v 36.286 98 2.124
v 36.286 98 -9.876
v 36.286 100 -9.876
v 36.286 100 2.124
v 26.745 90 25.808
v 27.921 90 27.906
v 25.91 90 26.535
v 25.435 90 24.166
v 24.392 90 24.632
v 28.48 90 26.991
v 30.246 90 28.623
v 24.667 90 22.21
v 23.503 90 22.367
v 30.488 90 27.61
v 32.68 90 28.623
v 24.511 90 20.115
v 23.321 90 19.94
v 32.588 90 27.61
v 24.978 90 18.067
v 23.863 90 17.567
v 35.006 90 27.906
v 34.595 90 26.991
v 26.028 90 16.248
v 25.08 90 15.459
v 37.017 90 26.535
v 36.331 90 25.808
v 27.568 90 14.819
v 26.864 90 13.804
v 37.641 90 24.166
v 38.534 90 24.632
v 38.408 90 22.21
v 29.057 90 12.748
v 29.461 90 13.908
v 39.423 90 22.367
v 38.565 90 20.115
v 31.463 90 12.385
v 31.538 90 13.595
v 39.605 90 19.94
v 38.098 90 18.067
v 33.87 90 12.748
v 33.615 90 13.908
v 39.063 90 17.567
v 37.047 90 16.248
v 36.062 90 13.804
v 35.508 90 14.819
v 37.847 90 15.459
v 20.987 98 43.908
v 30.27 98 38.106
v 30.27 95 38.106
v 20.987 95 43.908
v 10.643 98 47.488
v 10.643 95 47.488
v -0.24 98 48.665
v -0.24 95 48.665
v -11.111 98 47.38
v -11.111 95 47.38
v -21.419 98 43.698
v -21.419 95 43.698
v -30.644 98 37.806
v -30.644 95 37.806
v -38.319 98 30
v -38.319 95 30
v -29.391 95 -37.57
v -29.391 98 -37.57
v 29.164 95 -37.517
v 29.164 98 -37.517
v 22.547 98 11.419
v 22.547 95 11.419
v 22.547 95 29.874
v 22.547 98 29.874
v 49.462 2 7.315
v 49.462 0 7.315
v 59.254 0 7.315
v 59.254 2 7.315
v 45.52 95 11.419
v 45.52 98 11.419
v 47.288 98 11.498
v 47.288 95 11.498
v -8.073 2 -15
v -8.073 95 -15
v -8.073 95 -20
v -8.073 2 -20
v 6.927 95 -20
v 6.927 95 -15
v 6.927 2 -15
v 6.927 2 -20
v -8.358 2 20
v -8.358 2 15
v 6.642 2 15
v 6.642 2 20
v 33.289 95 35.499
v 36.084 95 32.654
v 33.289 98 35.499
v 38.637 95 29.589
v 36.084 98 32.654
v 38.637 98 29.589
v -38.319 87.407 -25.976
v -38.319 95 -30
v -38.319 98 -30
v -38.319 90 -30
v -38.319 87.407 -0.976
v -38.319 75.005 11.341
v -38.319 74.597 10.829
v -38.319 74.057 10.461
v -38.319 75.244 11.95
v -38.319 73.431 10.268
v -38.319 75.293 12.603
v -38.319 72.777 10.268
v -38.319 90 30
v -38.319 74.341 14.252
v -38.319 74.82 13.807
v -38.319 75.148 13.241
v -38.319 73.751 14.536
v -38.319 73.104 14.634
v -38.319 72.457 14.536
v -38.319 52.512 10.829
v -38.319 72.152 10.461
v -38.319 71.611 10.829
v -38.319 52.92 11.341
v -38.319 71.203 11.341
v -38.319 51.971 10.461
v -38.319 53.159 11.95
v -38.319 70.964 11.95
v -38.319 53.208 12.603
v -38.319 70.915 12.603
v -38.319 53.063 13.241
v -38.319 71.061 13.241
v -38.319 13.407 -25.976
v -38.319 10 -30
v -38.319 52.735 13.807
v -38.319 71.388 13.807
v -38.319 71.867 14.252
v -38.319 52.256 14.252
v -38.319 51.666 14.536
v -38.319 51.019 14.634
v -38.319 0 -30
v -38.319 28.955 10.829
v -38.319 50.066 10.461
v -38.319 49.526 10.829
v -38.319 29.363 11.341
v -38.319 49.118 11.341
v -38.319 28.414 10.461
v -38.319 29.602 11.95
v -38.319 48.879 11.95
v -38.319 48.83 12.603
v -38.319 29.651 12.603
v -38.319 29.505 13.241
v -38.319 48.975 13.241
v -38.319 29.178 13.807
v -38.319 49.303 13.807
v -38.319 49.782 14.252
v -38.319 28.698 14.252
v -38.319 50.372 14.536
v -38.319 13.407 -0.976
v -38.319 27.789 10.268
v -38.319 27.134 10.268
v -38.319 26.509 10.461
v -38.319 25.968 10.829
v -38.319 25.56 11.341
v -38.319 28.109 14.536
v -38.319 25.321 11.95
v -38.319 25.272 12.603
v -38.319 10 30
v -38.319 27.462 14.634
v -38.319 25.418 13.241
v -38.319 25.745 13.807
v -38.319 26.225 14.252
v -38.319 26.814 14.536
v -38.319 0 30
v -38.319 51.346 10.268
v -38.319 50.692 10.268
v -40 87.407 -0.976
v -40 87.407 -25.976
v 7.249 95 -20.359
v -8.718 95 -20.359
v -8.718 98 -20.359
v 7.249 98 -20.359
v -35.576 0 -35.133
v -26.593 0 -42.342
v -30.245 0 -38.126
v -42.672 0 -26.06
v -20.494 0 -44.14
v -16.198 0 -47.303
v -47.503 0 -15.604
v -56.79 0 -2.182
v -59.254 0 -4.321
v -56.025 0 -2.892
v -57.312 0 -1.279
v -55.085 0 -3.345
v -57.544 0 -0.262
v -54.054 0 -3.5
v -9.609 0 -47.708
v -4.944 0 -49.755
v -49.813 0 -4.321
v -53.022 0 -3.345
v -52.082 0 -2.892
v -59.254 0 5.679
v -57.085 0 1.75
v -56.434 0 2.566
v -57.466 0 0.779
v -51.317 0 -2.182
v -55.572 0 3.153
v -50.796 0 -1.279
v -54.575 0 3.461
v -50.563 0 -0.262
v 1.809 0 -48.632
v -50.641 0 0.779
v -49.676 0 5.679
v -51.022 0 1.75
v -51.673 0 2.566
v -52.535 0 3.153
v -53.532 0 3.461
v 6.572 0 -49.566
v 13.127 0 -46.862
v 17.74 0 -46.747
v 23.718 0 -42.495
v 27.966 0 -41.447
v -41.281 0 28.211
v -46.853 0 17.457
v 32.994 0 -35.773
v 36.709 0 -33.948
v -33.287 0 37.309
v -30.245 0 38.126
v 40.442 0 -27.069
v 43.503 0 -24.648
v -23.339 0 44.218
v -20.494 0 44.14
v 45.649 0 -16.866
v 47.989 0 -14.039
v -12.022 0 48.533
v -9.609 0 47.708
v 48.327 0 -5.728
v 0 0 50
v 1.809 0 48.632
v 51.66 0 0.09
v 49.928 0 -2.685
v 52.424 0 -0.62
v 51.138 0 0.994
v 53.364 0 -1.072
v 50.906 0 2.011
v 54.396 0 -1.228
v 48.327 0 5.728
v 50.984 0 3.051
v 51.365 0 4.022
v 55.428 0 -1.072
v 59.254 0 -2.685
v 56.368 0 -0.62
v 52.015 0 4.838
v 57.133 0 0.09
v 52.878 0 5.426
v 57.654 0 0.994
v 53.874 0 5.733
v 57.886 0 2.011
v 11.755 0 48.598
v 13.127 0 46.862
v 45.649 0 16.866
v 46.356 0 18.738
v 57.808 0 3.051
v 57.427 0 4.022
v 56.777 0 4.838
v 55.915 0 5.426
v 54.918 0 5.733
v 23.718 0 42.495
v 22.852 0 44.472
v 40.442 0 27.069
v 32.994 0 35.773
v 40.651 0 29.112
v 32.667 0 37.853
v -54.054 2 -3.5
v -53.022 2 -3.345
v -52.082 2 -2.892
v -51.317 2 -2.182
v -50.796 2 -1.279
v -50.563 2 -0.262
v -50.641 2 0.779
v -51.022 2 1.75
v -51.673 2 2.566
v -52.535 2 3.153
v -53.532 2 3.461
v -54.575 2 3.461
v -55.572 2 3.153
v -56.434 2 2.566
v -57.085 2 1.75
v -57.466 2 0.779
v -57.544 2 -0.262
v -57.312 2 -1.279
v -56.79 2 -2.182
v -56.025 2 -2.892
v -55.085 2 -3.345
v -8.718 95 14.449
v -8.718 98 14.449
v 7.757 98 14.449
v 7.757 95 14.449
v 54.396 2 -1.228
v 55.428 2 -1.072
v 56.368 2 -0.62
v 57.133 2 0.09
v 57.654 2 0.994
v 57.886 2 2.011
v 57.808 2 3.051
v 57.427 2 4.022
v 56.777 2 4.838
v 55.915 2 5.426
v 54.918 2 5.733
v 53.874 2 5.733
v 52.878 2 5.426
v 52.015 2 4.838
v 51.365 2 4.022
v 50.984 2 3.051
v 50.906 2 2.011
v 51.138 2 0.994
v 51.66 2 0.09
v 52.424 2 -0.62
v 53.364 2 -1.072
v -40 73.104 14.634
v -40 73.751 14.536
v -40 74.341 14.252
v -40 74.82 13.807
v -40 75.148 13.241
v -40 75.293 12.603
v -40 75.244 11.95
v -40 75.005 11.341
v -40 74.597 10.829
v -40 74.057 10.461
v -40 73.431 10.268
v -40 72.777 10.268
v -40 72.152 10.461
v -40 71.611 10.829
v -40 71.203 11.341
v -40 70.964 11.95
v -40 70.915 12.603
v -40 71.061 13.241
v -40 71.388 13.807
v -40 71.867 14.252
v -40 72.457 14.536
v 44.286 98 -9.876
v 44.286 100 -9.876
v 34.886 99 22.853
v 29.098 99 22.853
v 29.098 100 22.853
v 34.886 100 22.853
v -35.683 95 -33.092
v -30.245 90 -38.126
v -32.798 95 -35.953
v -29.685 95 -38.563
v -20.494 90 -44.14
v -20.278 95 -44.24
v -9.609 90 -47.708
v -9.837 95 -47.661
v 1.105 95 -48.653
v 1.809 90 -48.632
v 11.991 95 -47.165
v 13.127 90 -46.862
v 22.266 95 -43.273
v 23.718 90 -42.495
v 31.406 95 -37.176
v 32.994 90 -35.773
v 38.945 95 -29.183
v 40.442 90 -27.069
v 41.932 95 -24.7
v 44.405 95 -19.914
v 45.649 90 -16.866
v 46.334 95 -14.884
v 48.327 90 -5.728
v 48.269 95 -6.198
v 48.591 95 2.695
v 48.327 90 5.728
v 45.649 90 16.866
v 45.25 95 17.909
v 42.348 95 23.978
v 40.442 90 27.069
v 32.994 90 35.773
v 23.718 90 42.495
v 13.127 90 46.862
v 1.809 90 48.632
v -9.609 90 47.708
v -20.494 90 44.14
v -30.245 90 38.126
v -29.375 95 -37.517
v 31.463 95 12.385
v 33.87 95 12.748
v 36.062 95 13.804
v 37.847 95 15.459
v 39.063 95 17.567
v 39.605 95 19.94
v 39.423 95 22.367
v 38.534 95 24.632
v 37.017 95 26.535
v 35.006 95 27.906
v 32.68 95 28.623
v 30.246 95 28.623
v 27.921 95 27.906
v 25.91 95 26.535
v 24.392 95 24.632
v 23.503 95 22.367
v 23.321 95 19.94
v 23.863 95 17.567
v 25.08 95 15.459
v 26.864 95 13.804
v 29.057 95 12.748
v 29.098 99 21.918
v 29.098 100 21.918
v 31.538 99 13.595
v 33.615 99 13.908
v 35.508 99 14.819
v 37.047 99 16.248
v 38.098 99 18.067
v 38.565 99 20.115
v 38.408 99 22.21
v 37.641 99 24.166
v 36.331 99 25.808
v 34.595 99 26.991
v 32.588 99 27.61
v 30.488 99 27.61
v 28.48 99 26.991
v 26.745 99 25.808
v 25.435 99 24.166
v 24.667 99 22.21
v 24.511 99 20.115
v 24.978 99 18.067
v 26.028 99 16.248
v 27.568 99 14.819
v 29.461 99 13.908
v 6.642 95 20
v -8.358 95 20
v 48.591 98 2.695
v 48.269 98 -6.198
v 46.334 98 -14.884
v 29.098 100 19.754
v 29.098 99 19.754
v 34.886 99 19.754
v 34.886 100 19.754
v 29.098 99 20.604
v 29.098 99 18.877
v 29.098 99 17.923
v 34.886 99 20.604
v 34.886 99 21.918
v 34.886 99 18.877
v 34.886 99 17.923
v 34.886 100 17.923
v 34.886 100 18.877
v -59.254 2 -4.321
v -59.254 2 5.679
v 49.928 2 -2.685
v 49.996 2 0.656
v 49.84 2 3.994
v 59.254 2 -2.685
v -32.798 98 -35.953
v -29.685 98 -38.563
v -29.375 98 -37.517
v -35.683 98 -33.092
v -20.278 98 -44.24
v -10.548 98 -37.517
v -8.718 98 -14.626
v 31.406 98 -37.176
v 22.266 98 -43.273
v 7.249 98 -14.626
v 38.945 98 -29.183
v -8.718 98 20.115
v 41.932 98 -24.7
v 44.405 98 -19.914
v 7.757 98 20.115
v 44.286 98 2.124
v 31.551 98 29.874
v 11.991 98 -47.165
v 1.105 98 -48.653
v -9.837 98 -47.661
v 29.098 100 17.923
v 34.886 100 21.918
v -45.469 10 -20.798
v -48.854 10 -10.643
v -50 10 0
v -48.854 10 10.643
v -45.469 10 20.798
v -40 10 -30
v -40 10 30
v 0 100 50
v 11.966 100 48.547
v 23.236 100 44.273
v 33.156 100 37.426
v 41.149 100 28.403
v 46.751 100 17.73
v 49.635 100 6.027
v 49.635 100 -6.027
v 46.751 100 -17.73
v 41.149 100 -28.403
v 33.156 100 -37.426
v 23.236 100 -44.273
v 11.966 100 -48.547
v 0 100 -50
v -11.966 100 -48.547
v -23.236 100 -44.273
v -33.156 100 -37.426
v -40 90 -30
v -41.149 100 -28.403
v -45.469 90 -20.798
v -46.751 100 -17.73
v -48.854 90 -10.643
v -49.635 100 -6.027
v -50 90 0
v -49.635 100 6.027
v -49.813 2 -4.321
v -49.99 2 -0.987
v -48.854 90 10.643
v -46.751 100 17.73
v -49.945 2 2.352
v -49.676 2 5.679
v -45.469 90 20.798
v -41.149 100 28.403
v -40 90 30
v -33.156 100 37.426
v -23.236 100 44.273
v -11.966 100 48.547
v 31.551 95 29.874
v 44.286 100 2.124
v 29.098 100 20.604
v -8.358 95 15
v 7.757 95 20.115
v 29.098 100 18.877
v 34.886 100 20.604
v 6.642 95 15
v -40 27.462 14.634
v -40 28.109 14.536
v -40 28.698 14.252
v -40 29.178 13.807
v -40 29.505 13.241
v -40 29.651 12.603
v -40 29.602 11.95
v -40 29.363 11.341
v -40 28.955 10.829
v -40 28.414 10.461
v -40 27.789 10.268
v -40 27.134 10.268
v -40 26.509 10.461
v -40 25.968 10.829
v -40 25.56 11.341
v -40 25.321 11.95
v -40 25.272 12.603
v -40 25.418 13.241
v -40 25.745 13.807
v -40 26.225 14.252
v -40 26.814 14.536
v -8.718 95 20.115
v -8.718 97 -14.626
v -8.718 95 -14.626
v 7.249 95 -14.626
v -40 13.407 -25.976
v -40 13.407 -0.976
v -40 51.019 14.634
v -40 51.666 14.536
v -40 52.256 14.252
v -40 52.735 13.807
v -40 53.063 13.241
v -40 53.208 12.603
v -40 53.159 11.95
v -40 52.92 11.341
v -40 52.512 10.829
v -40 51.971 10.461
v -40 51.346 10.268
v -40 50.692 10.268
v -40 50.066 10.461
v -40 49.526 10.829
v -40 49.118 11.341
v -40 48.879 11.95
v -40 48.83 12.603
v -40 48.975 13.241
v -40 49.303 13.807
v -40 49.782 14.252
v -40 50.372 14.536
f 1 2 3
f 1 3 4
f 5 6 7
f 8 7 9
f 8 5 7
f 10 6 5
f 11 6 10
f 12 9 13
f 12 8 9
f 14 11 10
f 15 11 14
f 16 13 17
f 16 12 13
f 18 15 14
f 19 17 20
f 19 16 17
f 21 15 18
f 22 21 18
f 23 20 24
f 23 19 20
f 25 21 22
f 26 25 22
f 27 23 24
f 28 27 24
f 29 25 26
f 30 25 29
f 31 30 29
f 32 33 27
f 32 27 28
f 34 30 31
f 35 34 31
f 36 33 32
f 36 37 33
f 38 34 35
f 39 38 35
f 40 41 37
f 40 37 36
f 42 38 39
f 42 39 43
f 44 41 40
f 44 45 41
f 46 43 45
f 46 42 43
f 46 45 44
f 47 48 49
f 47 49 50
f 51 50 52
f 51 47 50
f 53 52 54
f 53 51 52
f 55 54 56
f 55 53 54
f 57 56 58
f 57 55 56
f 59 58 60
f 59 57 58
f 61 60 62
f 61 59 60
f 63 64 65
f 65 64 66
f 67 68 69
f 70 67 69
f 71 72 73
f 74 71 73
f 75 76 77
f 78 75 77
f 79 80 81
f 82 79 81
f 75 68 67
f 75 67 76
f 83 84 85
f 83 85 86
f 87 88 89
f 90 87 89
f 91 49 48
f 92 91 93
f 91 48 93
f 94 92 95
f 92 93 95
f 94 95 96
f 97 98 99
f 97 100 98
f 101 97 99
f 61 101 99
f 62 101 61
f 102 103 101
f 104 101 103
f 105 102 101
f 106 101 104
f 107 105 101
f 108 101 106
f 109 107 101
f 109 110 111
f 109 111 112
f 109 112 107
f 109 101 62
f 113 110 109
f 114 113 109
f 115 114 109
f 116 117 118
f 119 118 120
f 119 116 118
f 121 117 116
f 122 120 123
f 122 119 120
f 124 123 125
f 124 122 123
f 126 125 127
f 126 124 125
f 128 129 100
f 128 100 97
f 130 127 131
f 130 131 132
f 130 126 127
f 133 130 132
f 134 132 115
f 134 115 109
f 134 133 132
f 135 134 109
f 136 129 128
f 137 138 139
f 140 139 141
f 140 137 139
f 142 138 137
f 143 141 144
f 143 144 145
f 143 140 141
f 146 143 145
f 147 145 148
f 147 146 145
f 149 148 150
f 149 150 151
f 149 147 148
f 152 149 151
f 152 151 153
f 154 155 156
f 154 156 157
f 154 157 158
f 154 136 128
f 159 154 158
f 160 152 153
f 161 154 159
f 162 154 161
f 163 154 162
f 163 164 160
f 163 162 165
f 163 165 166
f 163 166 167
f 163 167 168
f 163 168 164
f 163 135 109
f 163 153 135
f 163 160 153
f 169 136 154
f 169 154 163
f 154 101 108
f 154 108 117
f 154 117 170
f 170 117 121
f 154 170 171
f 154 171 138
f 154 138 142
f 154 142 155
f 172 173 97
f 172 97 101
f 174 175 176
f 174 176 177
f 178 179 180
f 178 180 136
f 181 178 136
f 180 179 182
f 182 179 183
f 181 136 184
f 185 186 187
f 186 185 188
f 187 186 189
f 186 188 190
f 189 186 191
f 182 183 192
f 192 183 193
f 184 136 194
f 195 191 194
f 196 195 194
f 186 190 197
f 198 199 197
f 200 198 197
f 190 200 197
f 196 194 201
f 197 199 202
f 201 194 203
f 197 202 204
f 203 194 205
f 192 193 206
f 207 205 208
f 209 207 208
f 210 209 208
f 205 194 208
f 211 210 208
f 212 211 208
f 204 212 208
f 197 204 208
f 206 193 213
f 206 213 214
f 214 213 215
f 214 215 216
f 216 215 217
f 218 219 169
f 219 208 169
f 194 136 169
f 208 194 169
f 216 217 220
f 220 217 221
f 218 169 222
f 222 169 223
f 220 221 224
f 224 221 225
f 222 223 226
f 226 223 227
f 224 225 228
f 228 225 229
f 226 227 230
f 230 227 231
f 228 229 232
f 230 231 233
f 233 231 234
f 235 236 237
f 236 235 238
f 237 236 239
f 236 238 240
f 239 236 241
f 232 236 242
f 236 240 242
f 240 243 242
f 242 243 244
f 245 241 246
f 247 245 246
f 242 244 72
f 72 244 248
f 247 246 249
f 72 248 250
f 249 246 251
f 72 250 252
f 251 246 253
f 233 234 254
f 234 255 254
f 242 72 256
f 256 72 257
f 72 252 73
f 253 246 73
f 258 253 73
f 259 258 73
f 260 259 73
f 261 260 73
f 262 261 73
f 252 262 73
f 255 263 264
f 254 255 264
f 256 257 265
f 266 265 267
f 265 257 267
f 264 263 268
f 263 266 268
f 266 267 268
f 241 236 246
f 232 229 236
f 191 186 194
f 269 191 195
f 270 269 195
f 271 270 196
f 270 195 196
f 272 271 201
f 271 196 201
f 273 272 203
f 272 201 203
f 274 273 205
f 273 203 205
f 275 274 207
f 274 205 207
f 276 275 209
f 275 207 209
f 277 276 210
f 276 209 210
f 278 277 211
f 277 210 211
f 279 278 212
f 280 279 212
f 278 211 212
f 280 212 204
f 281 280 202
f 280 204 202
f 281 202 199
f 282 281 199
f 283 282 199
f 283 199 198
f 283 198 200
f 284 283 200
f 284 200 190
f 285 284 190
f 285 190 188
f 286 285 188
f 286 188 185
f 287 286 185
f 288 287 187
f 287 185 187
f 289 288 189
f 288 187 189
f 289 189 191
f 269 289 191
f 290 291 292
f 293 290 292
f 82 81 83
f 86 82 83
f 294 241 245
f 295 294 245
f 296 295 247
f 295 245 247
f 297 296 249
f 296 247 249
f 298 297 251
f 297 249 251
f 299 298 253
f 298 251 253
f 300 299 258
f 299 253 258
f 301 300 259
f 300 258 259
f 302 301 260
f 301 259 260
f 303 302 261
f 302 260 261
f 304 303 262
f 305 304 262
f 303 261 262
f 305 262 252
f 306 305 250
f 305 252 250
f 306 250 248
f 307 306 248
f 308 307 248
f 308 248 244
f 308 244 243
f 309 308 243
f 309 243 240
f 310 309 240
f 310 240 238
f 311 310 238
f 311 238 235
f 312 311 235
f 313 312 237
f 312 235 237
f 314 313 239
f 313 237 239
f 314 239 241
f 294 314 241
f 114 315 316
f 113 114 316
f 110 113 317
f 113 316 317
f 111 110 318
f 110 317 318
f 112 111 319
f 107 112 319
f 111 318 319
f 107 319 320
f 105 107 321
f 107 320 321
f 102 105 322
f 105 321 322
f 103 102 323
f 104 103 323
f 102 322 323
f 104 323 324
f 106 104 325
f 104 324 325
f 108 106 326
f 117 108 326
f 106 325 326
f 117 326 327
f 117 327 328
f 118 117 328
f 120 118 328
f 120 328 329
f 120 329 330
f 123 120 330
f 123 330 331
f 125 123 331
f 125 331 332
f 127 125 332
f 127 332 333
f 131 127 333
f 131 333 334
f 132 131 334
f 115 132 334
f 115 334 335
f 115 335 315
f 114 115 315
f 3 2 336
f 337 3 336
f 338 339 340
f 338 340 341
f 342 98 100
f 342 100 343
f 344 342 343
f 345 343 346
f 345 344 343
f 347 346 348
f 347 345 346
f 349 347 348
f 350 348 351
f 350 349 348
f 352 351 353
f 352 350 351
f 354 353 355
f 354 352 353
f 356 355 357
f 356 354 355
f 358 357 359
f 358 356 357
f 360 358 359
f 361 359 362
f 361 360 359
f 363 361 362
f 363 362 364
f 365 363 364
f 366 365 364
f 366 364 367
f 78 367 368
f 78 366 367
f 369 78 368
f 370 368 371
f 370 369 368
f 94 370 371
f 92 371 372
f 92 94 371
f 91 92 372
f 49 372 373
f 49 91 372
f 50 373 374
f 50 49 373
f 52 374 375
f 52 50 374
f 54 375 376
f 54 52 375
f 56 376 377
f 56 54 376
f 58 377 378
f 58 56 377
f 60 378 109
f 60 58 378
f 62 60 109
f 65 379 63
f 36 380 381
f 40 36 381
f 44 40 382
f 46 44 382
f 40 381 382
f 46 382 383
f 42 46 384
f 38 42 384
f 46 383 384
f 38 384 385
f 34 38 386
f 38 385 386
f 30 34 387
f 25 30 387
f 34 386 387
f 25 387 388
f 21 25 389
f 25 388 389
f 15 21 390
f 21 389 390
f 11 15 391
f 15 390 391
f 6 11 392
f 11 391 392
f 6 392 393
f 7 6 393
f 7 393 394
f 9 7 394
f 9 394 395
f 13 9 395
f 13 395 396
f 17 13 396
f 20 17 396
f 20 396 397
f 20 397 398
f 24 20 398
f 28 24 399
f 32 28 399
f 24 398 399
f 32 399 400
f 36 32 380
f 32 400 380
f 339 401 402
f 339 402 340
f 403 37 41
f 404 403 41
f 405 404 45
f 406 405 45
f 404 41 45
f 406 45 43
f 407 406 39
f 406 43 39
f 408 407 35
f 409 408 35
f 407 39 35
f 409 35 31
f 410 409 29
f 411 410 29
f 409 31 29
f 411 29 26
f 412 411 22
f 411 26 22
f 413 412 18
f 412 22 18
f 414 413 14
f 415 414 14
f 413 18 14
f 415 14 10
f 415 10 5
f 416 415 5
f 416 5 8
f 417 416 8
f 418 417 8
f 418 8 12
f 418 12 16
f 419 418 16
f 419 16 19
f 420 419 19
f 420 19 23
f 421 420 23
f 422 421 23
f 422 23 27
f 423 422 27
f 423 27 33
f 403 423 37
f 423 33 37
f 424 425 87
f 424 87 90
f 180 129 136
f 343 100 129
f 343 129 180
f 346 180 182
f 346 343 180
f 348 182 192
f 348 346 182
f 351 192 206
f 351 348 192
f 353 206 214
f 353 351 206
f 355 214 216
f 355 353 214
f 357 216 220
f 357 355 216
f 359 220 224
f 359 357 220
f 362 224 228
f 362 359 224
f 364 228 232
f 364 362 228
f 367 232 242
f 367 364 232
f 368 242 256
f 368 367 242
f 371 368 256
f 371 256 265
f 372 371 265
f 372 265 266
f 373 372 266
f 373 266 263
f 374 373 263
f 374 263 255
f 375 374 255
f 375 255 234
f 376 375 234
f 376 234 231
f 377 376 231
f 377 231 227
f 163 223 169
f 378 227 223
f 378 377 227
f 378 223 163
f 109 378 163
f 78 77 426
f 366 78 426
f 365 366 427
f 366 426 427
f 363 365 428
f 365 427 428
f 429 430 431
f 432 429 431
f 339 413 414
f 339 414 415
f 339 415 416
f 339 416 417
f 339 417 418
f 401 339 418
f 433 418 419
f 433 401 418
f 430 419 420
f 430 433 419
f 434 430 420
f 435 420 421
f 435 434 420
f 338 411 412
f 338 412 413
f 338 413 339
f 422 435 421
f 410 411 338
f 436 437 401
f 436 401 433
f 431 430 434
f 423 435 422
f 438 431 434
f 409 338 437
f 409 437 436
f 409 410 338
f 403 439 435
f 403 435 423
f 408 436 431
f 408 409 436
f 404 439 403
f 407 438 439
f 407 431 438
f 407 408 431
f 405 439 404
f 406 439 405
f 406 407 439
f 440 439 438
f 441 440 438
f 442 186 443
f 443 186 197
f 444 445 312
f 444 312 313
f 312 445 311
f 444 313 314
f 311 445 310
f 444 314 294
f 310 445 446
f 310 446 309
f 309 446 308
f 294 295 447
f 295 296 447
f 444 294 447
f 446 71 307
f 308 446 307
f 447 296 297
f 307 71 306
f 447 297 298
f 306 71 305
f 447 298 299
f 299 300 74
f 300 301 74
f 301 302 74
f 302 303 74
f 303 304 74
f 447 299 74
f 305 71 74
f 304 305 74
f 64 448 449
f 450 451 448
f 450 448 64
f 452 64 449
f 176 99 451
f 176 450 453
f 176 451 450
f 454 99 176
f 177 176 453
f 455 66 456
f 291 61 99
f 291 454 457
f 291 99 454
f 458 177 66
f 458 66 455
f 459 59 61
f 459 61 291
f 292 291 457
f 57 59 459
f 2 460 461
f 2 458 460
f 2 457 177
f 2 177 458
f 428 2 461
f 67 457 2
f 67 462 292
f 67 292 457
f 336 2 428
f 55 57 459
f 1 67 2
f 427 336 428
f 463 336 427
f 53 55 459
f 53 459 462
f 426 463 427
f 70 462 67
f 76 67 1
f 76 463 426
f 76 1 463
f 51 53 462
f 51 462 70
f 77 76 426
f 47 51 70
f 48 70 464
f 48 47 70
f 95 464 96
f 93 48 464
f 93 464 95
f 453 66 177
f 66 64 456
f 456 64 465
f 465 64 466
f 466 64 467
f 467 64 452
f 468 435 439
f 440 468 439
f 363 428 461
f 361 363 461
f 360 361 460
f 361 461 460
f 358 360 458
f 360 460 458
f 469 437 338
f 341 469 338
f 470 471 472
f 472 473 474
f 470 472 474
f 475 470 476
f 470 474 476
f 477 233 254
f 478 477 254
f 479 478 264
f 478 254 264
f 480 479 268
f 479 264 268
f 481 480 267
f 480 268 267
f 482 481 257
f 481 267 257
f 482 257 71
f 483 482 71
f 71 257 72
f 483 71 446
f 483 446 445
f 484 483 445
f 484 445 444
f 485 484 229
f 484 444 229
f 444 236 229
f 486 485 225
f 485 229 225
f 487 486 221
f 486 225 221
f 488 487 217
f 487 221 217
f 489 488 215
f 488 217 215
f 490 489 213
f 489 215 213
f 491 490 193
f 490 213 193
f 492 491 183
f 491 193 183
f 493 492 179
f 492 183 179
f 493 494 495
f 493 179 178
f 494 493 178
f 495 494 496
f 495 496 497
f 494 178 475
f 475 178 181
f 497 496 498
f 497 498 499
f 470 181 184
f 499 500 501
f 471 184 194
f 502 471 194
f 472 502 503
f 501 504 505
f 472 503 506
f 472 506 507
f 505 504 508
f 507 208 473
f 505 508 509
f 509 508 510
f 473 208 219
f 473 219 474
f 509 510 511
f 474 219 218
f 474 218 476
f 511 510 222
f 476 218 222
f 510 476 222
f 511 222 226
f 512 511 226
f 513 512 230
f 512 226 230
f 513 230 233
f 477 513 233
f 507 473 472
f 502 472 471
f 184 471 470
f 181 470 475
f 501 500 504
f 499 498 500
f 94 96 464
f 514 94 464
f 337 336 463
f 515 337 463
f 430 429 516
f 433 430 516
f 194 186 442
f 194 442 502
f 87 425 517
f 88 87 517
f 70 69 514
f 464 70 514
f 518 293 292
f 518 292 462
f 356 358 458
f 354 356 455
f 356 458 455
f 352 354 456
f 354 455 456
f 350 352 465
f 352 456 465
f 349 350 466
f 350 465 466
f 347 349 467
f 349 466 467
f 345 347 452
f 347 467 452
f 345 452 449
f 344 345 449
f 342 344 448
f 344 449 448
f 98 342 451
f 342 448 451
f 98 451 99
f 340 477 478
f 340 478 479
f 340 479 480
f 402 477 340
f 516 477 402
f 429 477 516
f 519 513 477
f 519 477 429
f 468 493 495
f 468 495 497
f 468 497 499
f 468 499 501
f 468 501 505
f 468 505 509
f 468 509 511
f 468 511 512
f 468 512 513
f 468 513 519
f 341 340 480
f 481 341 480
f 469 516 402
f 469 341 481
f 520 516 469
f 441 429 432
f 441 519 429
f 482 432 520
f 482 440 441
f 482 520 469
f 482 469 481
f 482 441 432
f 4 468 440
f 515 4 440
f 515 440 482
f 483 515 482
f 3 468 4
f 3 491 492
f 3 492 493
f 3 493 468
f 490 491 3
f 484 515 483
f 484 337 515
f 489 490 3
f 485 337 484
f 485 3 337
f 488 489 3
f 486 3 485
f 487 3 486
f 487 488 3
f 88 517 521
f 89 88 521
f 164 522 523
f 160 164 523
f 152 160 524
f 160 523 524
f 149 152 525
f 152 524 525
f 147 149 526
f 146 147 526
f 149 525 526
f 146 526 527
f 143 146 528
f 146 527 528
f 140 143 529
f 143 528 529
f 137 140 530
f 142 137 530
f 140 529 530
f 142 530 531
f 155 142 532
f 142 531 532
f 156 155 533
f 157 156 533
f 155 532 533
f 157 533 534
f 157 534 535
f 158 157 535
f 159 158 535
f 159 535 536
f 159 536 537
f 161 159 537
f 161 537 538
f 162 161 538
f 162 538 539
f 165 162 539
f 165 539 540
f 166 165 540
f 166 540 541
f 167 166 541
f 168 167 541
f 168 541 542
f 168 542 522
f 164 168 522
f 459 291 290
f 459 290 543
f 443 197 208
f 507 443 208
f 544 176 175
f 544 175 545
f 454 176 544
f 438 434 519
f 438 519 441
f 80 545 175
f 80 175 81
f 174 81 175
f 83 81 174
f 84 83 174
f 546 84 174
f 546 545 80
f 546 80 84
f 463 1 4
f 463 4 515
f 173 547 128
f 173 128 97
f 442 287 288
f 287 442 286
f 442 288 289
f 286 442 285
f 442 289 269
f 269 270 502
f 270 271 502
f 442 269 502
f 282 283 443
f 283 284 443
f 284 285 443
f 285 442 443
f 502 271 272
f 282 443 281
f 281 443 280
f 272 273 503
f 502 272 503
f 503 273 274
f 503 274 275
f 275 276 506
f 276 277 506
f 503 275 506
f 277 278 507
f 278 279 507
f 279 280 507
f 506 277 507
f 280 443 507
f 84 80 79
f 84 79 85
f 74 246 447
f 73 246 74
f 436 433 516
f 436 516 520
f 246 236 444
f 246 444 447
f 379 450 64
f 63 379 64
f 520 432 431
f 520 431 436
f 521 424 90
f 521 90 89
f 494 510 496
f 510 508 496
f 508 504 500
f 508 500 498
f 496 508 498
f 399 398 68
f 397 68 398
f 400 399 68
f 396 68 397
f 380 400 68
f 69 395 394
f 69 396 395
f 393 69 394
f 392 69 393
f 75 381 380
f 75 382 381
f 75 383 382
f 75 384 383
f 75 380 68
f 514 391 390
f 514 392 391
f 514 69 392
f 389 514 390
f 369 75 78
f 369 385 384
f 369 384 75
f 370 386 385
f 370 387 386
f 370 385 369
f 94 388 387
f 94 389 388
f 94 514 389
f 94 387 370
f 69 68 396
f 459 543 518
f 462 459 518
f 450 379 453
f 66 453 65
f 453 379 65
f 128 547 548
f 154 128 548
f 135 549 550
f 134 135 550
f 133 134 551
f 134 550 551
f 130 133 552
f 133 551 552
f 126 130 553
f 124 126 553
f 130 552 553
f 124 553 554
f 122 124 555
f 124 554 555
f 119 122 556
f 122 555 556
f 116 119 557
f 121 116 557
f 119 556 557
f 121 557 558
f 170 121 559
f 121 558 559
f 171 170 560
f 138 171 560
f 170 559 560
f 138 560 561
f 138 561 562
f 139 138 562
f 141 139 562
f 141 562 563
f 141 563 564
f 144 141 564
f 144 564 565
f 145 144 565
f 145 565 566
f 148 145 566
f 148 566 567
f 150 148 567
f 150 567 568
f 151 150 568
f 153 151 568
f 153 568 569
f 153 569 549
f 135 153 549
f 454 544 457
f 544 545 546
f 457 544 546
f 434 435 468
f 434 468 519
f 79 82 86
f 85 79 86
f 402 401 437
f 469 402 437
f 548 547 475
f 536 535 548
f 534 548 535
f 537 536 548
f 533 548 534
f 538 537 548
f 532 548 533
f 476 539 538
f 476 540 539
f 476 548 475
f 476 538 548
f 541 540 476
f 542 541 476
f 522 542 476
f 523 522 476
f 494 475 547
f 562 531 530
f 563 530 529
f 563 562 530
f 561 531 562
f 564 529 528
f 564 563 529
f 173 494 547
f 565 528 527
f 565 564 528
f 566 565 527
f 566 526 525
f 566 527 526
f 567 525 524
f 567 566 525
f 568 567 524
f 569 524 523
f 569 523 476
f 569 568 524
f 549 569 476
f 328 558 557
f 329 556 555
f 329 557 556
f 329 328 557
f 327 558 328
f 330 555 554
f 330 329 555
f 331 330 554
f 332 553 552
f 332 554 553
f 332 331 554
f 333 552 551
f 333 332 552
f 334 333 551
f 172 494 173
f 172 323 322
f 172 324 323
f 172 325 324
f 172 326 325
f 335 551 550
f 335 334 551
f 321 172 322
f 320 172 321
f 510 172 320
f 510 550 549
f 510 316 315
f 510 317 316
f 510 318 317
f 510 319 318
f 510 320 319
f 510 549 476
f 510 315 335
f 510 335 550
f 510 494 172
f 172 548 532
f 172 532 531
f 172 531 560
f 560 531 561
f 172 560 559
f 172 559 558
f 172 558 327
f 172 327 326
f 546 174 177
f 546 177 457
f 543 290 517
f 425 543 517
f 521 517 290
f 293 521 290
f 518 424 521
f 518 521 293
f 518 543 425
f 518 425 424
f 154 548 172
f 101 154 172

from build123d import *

# Parameters (mm, degrees)
SKETCH2_R            = 50
BOSS_EXTRUDE1_DEPTH  = 100
SKETCH3_W            = 60
SKETCH3_H            = 80
CUT_EXTRUDE1_DEPTH   = 60
SKETCH4_W            = 60
SKETCH4_H            = 79.669831605
BOSS_EXTRUDE3_DEPTH  = 40
SKETCH5_R            = 38
CUT_EXTRUDE2_DEPTH   = 90
SKETCH8_W            = 60
SKETCH8_H            = 79.669831605
CUT_EXTRUDE7_DEPTH   = 50
SKETCH10_R           = 48.665518172
CUT_EXTRUDE9_DEPTH   = 100
SKETCH11_W           = 1.681170961
SKETCH11_H           = 60
BOSS_EXTRUDE5_DEPTH  = 80
SKETCH13_W           = 1.681170961
SKETCH13_H           = 60
BOSS_EXTRUDE7_DEPTH  = 10
BOSS_EXTRUDE8_DEPTH  = 10
CUT_EXTRUDE10_START  = -5
CUT_EXTRUDE10_DEPTH  = 5
SKETCH19_R           = 8.164764715
BOSS_EXTRUDE10_DEPTH = 5
SKETCH20_R           = 7.047060341
CUT_EXTRUDE11_DEPTH  = 9
SKETCH21_W           = 5.787931414
SKETCH21_H           = 0.934183286
SKETCH21_H_2         = 0.954014791
SKETCH21_H_3         = 0.849697664
CUT_EXTRUDE12_DEPTH  = 9
SKETCH23_R           = 2.195287673
SKETCH23_W           = 25
SKETCH23_H           = 74
CUT_EXTRUDE13_DEPTH  = 9
SKETCH24_W           = 15
SKETCH24_H           = 5
BOSS_EXTRUDE11_DEPTH = 98
SKETCH25_W           = 18.827507882
SKETCH25_H           = 73.375554396
CUT_EXTRUDE14_DEPTH  = 98
SKETCH26_W           = 18.827507882
SKETCH26_H           = 73.375554396
BOSS_EXTRUDE12_DEPTH = 1
SKETCH27_W           = 10.029903479
SKETCH27_H           = 10
BOSS_EXTRUDE13_DEPTH = 2
SKETCH28_R           = 3.5
CUT_EXTRUDE15_DEPTH  = 2
SKETCH29_W           = 58.538941248
SKETCH29_H           = 14.680012791
CUT_EXTRUDE16_DEPTH  = 98
SKETCH30_W           = 20.214113165
SKETCH30_H           = 34.255978035
CUT_EXTRUDE17_DEPTH  = 98
SKETCH33_W           = 8
SKETCH33_H           = 12
CUT_EXTRUDE19_DEPTH  = 98
SKETCH34_W           = 16.356457981
SKETCH34_H           = 26.077749045
CUT_EXTRUDE20_DEPTH  = 98
SKETCH35_W           = 19.445222932
SKETCH35_H           = 19.770916388
CUT_EXTRUDE21_DEPTH  = 10
SKETCH36_W           = 19.989215452
SKETCH36_H           = 72.827965385
CUT_EXTRUDE24_DEPTH  = 10
SKETCH37_W           = 31.787676572
SKETCH37_H           = 10.342401947
CUT_EXTRUDE26_DEPTH  = 10
SKETCH38_W           = 20.901341983
SKETCH38_H           = 4.203034319
SKETCH38_H_2         = 3.820046546
SKETCH38_W_2         = 30.533824488
SKETCH38_H_3         = 14.057901902
CUT_EXTRUDE32_DEPTH  = 2
SKETCH39_W           = 30.533824488
SKETCH39_H           = 14.057901902
CUT_EXTRUDE33_DEPTH  = 1
SKETCH40_W           = 20.553607572
SKETCH40_H           = 73.375554396
BOSS_EXTRUDE14_DEPTH = 1
SKETCH41_W           = 32.621281634
SKETCH41_H           = 15.74299434
CUT_EXTRUDE34_DEPTH  = 3
SKETCH42_W           = 14.144755604
SKETCH42_H           = 8.69656923
CUT_EXTRUDE35_DEPTH  = 3
SKETCH43_W           = 59.644827438
SKETCH43_H           = 2.247870114
CUT_EXTRUDE36_DEPTH  = 3
SKETCH44_W           = 17.667291541
SKETCH44_H           = 3.320818604
SKETCH44_W_2         = 14.753104975
SKETCH44_H_2         = 11.677562162
CUT_EXTRUDE38_DEPTH  = 3
SKETCH46_W           = 17.667291541
SKETCH46_H           = 3.320818604
CUT_EXTRUDE40_DEPTH  = 1
SKETCH47_W           = 1.701021163
SKETCH47_H           = 8.211244537
CUT_EXTRUDE41_DEPTH  = 3
SKETCH48_W           = 15.966270378
SKETCH48_H           = 2.478389594
CUT_EXTRUDE42_DEPTH  = 3
SKETCH49_W           = 10.473630753
SKETCH49_H           = 60
CUT_EXTRUDE43_DEPTH  = 3
CUT_EXTRUDE44_DEPTH  = 3
SKETCH51_W           = 3.315159192
SKETCH51_H           = 22.138520704
CUT_EXTRUDE45_DEPTH  = 3
CUT_EXTRUDE52_START  = -3
CUT_EXTRUDE52_DEPTH  = 3
CUT_EXTRUDE57_START  = -3
CUT_EXTRUDE57_DEPTH  = 3
CUT_EXTRUDE58_START  = -3
CUT_EXTRUDE58_DEPTH  = 3
CUT_EXTRUDE59_START  = -3
CUT_EXTRUDE59_DEPTH  = 3
CUT_EXTRUDE60_START  = -3
CUT_EXTRUDE60_DEPTH  = 3
SKETCH59_W           = 11.723658734
SKETCH59_H           = 19.471980535
CUT_EXTRUDE63_DEPTH  = 1
SKETCH60_W           = 11.417157191
SKETCH60_H           = 17.445400415
CUT_EXTRUDE65_DEPTH  = 3
CUT_EXTRUDE66_START  = -3
CUT_EXTRUDE66_DEPTH  = 3


with BuildPart() as part:
    # Sketch2 → Boss-Extrude1 (new body)
    with BuildSketch(Plane(origin=(0, 0, 0), x_dir=(1, 0, 0), z_dir=(0, 1, 0))):
        with Locations(Location((0, 0, 0), (0, 0, 270))):
            Circle(SKETCH2_R)
    extrude(amount=BOSS_EXTRUDE1_DEPTH)

    # Sketch3 → Cut-Extrude1 (cut)
    with BuildSketch(Plane(origin=(0, 0, 0), x_dir=(0, 0, -1), z_dir=(1, 0, 0))):
        with Locations((0, 50)):
            Rectangle(SKETCH3_W, SKETCH3_H)
    extrude(amount=-CUT_EXTRUDE1_DEPTH, mode=Mode.SUBTRACT)

    # Sketch4 → Boss-Extrude3 (add)
    with BuildSketch(Plane.ZY):
        with Locations((0, 49.834915802)):
            Rectangle(SKETCH4_W, SKETCH4_H)
    extrude(amount=BOSS_EXTRUDE3_DEPTH)

    # Sketch5 → Cut-Extrude2 (cut)
    with BuildSketch(Plane(origin=(0, 0, 0), x_dir=(1, 0, 0), z_dir=(0, 1, 0))):
        with Locations(Location((0, 0, 0), (0, 0, 127.863646362))):
            Circle(SKETCH5_R)
    extrude(amount=CUT_EXTRUDE2_DEPTH, mode=Mode.SUBTRACT)

    # Sketch8 → Cut-Extrude7 (cut)
    with BuildSketch(Plane.ZY.offset(40)):
        with Locations((0, 49.834915802)):
            Rectangle(SKETCH8_W, SKETCH8_H)
    extrude(amount=-CUT_EXTRUDE7_DEPTH, mode=Mode.SUBTRACT)

    # Sketch10 → Cut-Extrude9 (cut)
    with BuildSketch(Plane(origin=(0, 90, 0), x_dir=(-1, 0, 0), z_dir=(0, -1, 0))):
        with Locations(Location((0, 0, 0), (0, 0, 270))):
            Circle(SKETCH10_R)
    extrude(amount=CUT_EXTRUDE9_DEPTH, mode=Mode.SUBTRACT)

    # Sketch11 → Boss-Extrude5 (add)
    with BuildSketch(Plane.XZ.offset(-90)):
        with Locations((-39.15941452, 0)):
            Rectangle(SKETCH11_W, SKETCH11_H)
    extrude(amount=BOSS_EXTRUDE5_DEPTH)

    # Sketch13 → Boss-Extrude7 (add)
    with BuildSketch(Plane.XZ.offset(-10)):
        with Locations((-39.15941452, 0)):
            Rectangle(SKETCH13_W, SKETCH13_H)
    extrude(amount=BOSS_EXTRUDE7_DEPTH)

    # Sketch16 → Boss-Extrude8 (add)
    with BuildSketch(Plane.XZ):
        with BuildLine():
            Line((-39.280045299, -29.075196623), (-39.280045299, 29.238392007))
            ThreePointArc((-39.280045299, 29.238392007), (-49.347436006, 0.081597692), (-39.280045299, -29.075196623))
        make_face()
    extrude(amount=-BOSS_EXTRUDE8_DEPTH)

    # Sketch17 → Cut-Extrude10 (cut)
    with BuildSketch(Plane.XZ.offset(-90).offset(CUT_EXTRUDE10_START)):
        with BuildLine():
            Line((-38.318829039, 30), (-38.318829039, -30))
            ThreePointArc((-38.318829039, -30), (48.665518172, 0), (-38.318829039, 30))
        make_face()
    extrude(amount=CUT_EXTRUDE10_DEPTH, mode=Mode.SUBTRACT)

    # Sketch19 → Boss-Extrude10 (add)
    with BuildSketch(Plane(origin=(0, 95, 0), x_dir=(-1, 0, 0), z_dir=(0, -1, 0))):
        with Locations(Location((-31.46311806, -20.549866857, 0), (0, 0, 90))):
            Circle(SKETCH19_R)
    extrude(amount=BOSS_EXTRUDE10_DEPTH)

    # Sketch20 → Cut-Extrude11 (cut)
    with BuildSketch(Plane(origin=(0, 90, 0), x_dir=(-1, 0, 0), z_dir=(0, -1, 0))):
        with Locations(Location((-31.537874796, -20.642045838, 0), (0, 0, 90))):
            Circle(SKETCH20_R)
    extrude(amount=-CUT_EXTRUDE11_DEPTH, mode=Mode.SUBTRACT)

    # Sketch21 → Cut-Extrude12 (cut)
    with BuildSketch(Plane.XZ.offset(-99)):
        with Locations((31.992398498, 22.385566745)):
            Rectangle(SKETCH21_W, SKETCH21_H)
        with Locations((31.992398498, 18.399985322)):
            Rectangle(SKETCH21_W, SKETCH21_H_2)
        with Locations((31.992398498, 20.17878045)):
            Rectangle(SKETCH21_W, SKETCH21_H_3)
    extrude(amount=-CUT_EXTRUDE12_DEPTH, mode=Mode.SUBTRACT)

    # Sketch23 → Cut-Extrude13 (cut)
    with BuildSketch(Plane.ZY.offset(40)):
        with Locations((12.438591757, 73.104072914)):
            Circle(SKETCH23_R)
        with Locations((12.438591757, 51.018979374)):
            Circle(SKETCH23_R)
        with Locations((12.438591757, 27.461546264)):
            Circle(SKETCH23_R)
        with Locations((-13.476086098, 50.407395829)):
            Rectangle(SKETCH23_W, SKETCH23_H)
    extrude(amount=-CUT_EXTRUDE13_DEPTH, mode=Mode.SUBTRACT)

    # Sketch24 → Boss-Extrude11 (add)
    with BuildSketch(Plane(origin=(0, 100, 0), x_dir=(1, 0, 0), z_dir=(0, 1, 0))):
        with Locations((-0.85785595, -17.5)):
            Rectangle(SKETCH24_W, SKETCH24_H)
        with Locations((-0.572910756, 17.5)):
            Rectangle(SKETCH24_W, SKETCH24_H)
    extrude(amount=-BOSS_EXTRUDE11_DEPTH)

    # Sketch25 → Cut-Extrude14 (cut)
    with BuildSketch(Plane(origin=(0, 100, 0), x_dir=(1, 0, 0), z_dir=(0, 1, 0))):
        with Locations((-19.961314115, 0.829554283)):
            Rectangle(SKETCH25_W, SKETCH25_H)
    extrude(amount=-CUT_EXTRUDE14_DEPTH, mode=Mode.SUBTRACT)

    # Sketch26 → Boss-Extrude12 (add)
    with BuildSketch(Plane(origin=(0, 100, 0), x_dir=(1, 0, 0), z_dir=(0, 1, 0))):
        with Locations((-19.961314115, 0.829554283)):
            Rectangle(SKETCH26_W, SKETCH26_H)
    extrude(amount=-BOSS_EXTRUDE12_DEPTH)

    # Sketch27 → Boss-Extrude13 (add)
    with BuildSketch(Plane.XZ):
        with Locations((54.238631889, 2.31459311)):
            Rectangle(SKETCH27_W, SKETCH27_H)
        with Locations((-54.238631889, 0.679426194)):
            Rectangle(SKETCH27_W, SKETCH27_H)
    extrude(amount=-BOSS_EXTRUDE13_DEPTH)

    # Sketch28 → Cut-Extrude15 (cut)
    with BuildSketch(Plane.XZ):
        with Locations(Location((-54.053583629, 0, 0), (0, 0, 270))):
            Circle(SKETCH28_R)
        with Locations(Location((54.396100908, 2.272206882, 0), (0, 0, 270))):
            Circle(SKETCH28_R)
    extrude(amount=-CUT_EXTRUDE15_DEPTH, mode=Mode.SUBTRACT)

    # Sketch29 → Cut-Extrude16 (cut)
    with BuildSketch(Plane.XZ):
        with Locations((-0.105597432, -30.177325086)):
            Rectangle(SKETCH29_W, SKETCH29_H)
    extrude(amount=-CUT_EXTRUDE16_DEPTH, mode=Mode.SUBTRACT)

    # Sketch30 → Cut-Extrude17 (cut)
    with BuildSketch(Plane.XZ):
        with Locations((19.05681661, -5.709329673)):
            Rectangle(SKETCH30_W, SKETCH30_H)
    extrude(amount=-CUT_EXTRUDE17_DEPTH, mode=Mode.SUBTRACT)

    # Sketch33 → Cut-Extrude19 (cut)
    with BuildSketch(Plane.XZ.offset(-95)):
        with Locations((40.285881514, -3.875597271)):
            Rectangle(SKETCH33_W, SKETCH33_H)
    extrude(amount=-CUT_EXTRUDE19_DEPTH, mode=Mode.SUBTRACT)

    # Sketch34 → Cut-Extrude20 (cut)
    with BuildSketch(Plane.XZ):
        with Locations((37.342102182, -1.620215178)):
            Rectangle(SKETCH34_W, SKETCH34_H)
    extrude(amount=-CUT_EXTRUDE20_DEPTH, mode=Mode.SUBTRACT)

    # Sketch35 → Cut-Extrude21 (cut)
    with BuildSketch(Plane.XZ.offset(-98)):
        with Locations((-0.772851439, -1.419797355)):
            Rectangle(SKETCH35_W, SKETCH35_H)
    extrude(amount=CUT_EXTRUDE21_DEPTH, mode=Mode.SUBTRACT)

    # Sketch36 → Cut-Extrude24 (cut)
    with BuildSketch(Plane.XZ.offset(-98)):
        with Locations((-18.71213924, -1.103348788)):
            Rectangle(SKETCH36_W, SKETCH36_H)
    extrude(amount=CUT_EXTRUDE24_DEPTH, mode=Mode.SUBTRACT)

    # Sketch37 → Cut-Extrude26 (cut)
    with BuildSketch(Plane.XZ.offset(-98)):
        with Locations((6.007718778, 9.277742922)):
            Rectangle(SKETCH37_W, SKETCH37_H)
    extrude(amount=CUT_EXTRUDE26_DEPTH, mode=Mode.SUBTRACT)

    # Sketch38 → Cut-Extrude32 (cut)
    with BuildSketch(Plane(origin=(0, 95, 0), x_dir=(-1, 0, 0), z_dir=(0, -1, 0))):
        with Locations((-0.612367359, 12.524556994)):
            Rectangle(SKETCH38_W, SKETCH38_H)
        with Locations((-0.612367359, 23.030255384)):
            Rectangle(SKETCH38_W, SKETCH38_H_2)
        with Locations((-6.54938073, -28.281682953)):
            Rectangle(SKETCH38_W_2, SKETCH38_H_3)
    extrude(amount=-CUT_EXTRUDE32_DEPTH, mode=Mode.SUBTRACT)

    # Sketch39 → Cut-Extrude33 (cut)
    with BuildSketch(Plane.XZ.offset(-97)):
        with Locations((6.54938073, 28.281682953)):
            Rectangle(SKETCH39_W, SKETCH39_H)
    extrude(amount=-CUT_EXTRUDE33_DEPTH, mode=Mode.SUBTRACT)

    # Sketch40 → Boss-Extrude14 (add)
    with BuildSketch(Plane.XZ.offset(-99)):
        with Locations((-19.09826427, -0.829554283)):
            Rectangle(SKETCH40_W, SKETCH40_H)
    extrude(amount=BOSS_EXTRUDE14_DEPTH)

    # Sketch41 → Cut-Extrude34 (cut)
    with BuildSketch(Plane.XZ.offset(-95)):
        with Locations((5.763080643, 27.986725745)):
            Rectangle(SKETCH41_W, SKETCH41_H)
    extrude(amount=-CUT_EXTRUDE34_DEPTH, mode=Mode.SUBTRACT)

    # Sketch42 → Cut-Extrude35 (cut)
    with BuildSketch(Plane.XZ.offset(-95)):
        with Locations((14.829179262, 15.76694396)):
            Rectangle(SKETCH42_W, SKETCH42_H)
    extrude(amount=-CUT_EXTRUDE35_DEPTH, mode=Mode.SUBTRACT)

    # Sketch43 → Cut-Extrude36 (cut)
    with BuildSketch(Plane.XZ.offset(-95)):
        with Locations((0.447345663, 36.982157972)):
            Rectangle(SKETCH43_W, SKETCH43_H)
    extrude(amount=-CUT_EXTRUDE36_DEPTH, mode=Mode.SUBTRACT)

    # Sketch44 → Cut-Extrude38 (cut)
    with BuildSketch(Plane.XZ.offset(-97)):
        with Locations((0.116114256, -12.965664851)):
            Rectangle(SKETCH44_W, SKETCH44_H)
        with Locations((31.548416401, -18.552621957)):
            Rectangle(SKETCH44_W_2, SKETCH44_H_2)
    extrude(amount=CUT_EXTRUDE38_DEPTH, mode=Mode.SUBTRACT)

    # Sketch46 → Cut-Extrude40 (cut)
    with BuildSketch(Plane.XZ.offset(-97)):
        with Locations((0.116114256, -12.965664851)):
            Rectangle(SKETCH46_W, SKETCH46_H)
    extrude(amount=-CUT_EXTRUDE40_DEPTH, mode=Mode.SUBTRACT)

    # Sketch47 → Cut-Extrude41 (cut)
    with BuildSketch(Plane.XZ.offset(-95)):
        with Locations((8.099249445, -18.731696422)):
            Rectangle(SKETCH47_W, SKETCH47_H)
    extrude(amount=-CUT_EXTRUDE41_DEPTH, mode=Mode.SUBTRACT)

    # Sketch48 → Cut-Extrude42 (cut)
    with BuildSketch(Plane.XZ.offset(-95)):
        with Locations((-0.734396325, -21.598123893)):
            Rectangle(SKETCH48_W, SKETCH48_H)
    extrude(amount=-CUT_EXTRUDE42_DEPTH, mode=Mode.SUBTRACT)

    # Sketch49 → Cut-Extrude43 (cut)
    with BuildSketch(Plane.XZ.offset(-95)):
        with Locations((-33.082013663, 0)):
            Rectangle(SKETCH49_W, SKETCH49_H)
    extrude(amount=-CUT_EXTRUDE43_DEPTH, mode=Mode.SUBTRACT)

    # Sketch50 → Cut-Extrude44 (cut)
    with BuildSketch(Plane.XZ.offset(-95)):
        Polygon((22.07372146, 20.115228575), (22.07372146, 29.87376114), (21.033576275, 29.87376114), (21.033576275, 10.941534653), (22.07372146, 10.941534653), (22.07372146, 11.418659345), (21.901557064, 11.418659345), (21.901557064, 20.115228575), align=None)
        Polygon((30.269759382, 35.858222915), (22.07372146, 35.858222915), (22.07372146, 29.87376114), (31.551479878, 29.87376114), (31.551479878, 35.858222915), align=None)
    extrude(amount=-CUT_EXTRUDE44_DEPTH, mode=Mode.SUBTRACT)

    # Sketch51 → Cut-Extrude45 (cut)
    with BuildSketch(Plane.XZ.offset(-95)):
        with Locations((20.889886083, 20.153945891)):
            Rectangle(SKETCH51_W, SKETCH51_H)
    extrude(amount=-CUT_EXTRUDE45_DEPTH, mode=Mode.SUBTRACT)

    # Sketch53 → Cut-Extrude52 (cut)
    with BuildSketch(Plane.XZ.offset(-95).offset(CUT_EXTRUDE52_START)):
        with BuildLine():
            Line((-38.318829039, -30), (-29.375068056, -30))
            Line((-29.375068056, -30), (-29.375068056, -37.517331481))
            Line((-29.375068056, -37.517331481), (-29.684968226, -38.563393528))
            ThreePointArc((-29.684968226, -38.563393528), (-34.270425118, -34.552432927), (-38.318829039, -30))
        make_face()
    extrude(amount=CUT_EXTRUDE52_DEPTH, mode=Mode.SUBTRACT)

    # Sketch55 → Cut-Extrude57 (cut)
    with BuildSketch(Plane(origin=(0, 95, 0), x_dir=(-1, 0, 0), z_dir=(0, -1, 0)).offset(CUT_EXTRUDE57_START)):
        with BuildLine():
            Line((38.318829039, -30), (29.375068056, -30))
            Line((29.375068056, -30), (29.375068056, -38.106093029))
            Line((29.375068056, -38.106093029), (-30.269759382, -38.106093029))
            ThreePointArc((-30.269759382, -38.106093029), (5.711748124, -48.329169166), (38.318829039, -30))
        make_face()
    extrude(amount=CUT_EXTRUDE57_DEPTH, mode=Mode.SUBTRACT)

    # Sketch56 → Cut-Extrude58 (cut)
    with BuildSketch(Plane(origin=(0, 95, 0), x_dir=(-1, 0, 0), z_dir=(0, -1, 0)).offset(CUT_EXTRUDE58_START)):
        with BuildLine():
            Line((-38.636727711, -29.589456411), (-31.551479878, -29.87376114))
            Line((-31.551479878, -29.87376114), (-31.551479878, -35.858222915))
            Line((-31.551479878, -35.858222915), (-30.269759382, -35.858222915))
            Line((-30.269759382, -35.858222915), (-30.269759382, -38.106093029))
            ThreePointArc((-30.269759382, -38.106093029), (-34.715403867, -34.105327931), (-38.636727711, -29.589456411))
        make_face()
    extrude(amount=CUT_EXTRUDE58_DEPTH, mode=Mode.SUBTRACT)

    # Sketch57 → Cut-Extrude59 (cut)
    with BuildSketch(Plane(origin=(0, 95, 0), x_dir=(-1, 0, 0), z_dir=(0, -1, 0)).offset(CUT_EXTRUDE59_START)):
        with BuildLine():
            Line((-46.333675493, 14.8836546), (-45.520331173, 14.6590897))
            Line((-45.520331173, 14.6590897), (-45.520331173, -11.418659345))
            Line((-45.520331173, -11.418659345), (-47.287832143, -11.497547136))
            ThreePointArc((-47.287832143, -11.497547136), (-48.633719005, 1.75898683), (-46.333675493, 14.8836546))
        make_face()
    extrude(amount=CUT_EXTRUDE59_DEPTH, mode=Mode.SUBTRACT)

    # Sketch58 → Cut-Extrude60 (cut)
    with BuildSketch(Plane(origin=(0, 95, 0), x_dir=(-1, 0, 0), z_dir=(0, -1, 0)).offset(CUT_EXTRUDE60_START)):
        with BuildLine():
            Line((-38.944623515, 29.183025172), (-38.924968888, 14.6590897))
            Line((-38.924968888, 14.6590897), (-45.520331173, 14.6590897))
            Line((-45.520331173, 14.6590897), (-46.333675493, 14.8836546))
            ThreePointArc((-46.333675493, 14.8836546), (-43.23441997, 22.340939748), (-38.944623515, 29.183025172))
        make_face()
    extrude(amount=CUT_EXTRUDE60_DEPTH, mode=Mode.SUBTRACT)

    # Sketch59 → Cut-Extrude63 (cut)
    with BuildSketch(Plane.XZ.offset(-97)):
        with Locations((34.249956279, -16.696142801)):
            Rectangle(SKETCH59_W, SKETCH59_H)
    extrude(amount=-CUT_EXTRUDE63_DEPTH, mode=Mode.SUBTRACT)

    # Sketch60 → Cut-Extrude65 (cut)
    with BuildSketch(Plane.XZ.offset(-95)):
        with Locations((33.23604492, -20.460324964)):
            Rectangle(SKETCH60_W, SKETCH60_H)
    extrude(amount=-CUT_EXTRUDE65_DEPTH, mode=Mode.SUBTRACT)

    # Sketch61 → Cut-Extrude66 (cut)
    with BuildSketch(Plane(origin=(0, 95, 0), x_dir=(-1, 0, 0), z_dir=(0, -1, 0)).offset(CUT_EXTRUDE66_START)):
        with BuildLine():
            Line((29.684968226, 38.563393528), (29.390578265, 37.569685893))
            Line((29.390578265, 37.569685893), (-29.163873192, 37.517331481))
            Line((-29.163873192, 37.517331481), (-29.163873192, 29.183025172))
            Line((-29.163873192, 29.183025172), (-38.944623515, 29.183025172))
            ThreePointArc((-38.944623515, 29.183025172), (-6.590381752, 48.21721194), (29.684968226, 38.563393528))
        make_face()
    extrude(amount=CUT_EXTRUDE66_DEPTH, mode=Mode.SUBTRACT)


solid = part.part
